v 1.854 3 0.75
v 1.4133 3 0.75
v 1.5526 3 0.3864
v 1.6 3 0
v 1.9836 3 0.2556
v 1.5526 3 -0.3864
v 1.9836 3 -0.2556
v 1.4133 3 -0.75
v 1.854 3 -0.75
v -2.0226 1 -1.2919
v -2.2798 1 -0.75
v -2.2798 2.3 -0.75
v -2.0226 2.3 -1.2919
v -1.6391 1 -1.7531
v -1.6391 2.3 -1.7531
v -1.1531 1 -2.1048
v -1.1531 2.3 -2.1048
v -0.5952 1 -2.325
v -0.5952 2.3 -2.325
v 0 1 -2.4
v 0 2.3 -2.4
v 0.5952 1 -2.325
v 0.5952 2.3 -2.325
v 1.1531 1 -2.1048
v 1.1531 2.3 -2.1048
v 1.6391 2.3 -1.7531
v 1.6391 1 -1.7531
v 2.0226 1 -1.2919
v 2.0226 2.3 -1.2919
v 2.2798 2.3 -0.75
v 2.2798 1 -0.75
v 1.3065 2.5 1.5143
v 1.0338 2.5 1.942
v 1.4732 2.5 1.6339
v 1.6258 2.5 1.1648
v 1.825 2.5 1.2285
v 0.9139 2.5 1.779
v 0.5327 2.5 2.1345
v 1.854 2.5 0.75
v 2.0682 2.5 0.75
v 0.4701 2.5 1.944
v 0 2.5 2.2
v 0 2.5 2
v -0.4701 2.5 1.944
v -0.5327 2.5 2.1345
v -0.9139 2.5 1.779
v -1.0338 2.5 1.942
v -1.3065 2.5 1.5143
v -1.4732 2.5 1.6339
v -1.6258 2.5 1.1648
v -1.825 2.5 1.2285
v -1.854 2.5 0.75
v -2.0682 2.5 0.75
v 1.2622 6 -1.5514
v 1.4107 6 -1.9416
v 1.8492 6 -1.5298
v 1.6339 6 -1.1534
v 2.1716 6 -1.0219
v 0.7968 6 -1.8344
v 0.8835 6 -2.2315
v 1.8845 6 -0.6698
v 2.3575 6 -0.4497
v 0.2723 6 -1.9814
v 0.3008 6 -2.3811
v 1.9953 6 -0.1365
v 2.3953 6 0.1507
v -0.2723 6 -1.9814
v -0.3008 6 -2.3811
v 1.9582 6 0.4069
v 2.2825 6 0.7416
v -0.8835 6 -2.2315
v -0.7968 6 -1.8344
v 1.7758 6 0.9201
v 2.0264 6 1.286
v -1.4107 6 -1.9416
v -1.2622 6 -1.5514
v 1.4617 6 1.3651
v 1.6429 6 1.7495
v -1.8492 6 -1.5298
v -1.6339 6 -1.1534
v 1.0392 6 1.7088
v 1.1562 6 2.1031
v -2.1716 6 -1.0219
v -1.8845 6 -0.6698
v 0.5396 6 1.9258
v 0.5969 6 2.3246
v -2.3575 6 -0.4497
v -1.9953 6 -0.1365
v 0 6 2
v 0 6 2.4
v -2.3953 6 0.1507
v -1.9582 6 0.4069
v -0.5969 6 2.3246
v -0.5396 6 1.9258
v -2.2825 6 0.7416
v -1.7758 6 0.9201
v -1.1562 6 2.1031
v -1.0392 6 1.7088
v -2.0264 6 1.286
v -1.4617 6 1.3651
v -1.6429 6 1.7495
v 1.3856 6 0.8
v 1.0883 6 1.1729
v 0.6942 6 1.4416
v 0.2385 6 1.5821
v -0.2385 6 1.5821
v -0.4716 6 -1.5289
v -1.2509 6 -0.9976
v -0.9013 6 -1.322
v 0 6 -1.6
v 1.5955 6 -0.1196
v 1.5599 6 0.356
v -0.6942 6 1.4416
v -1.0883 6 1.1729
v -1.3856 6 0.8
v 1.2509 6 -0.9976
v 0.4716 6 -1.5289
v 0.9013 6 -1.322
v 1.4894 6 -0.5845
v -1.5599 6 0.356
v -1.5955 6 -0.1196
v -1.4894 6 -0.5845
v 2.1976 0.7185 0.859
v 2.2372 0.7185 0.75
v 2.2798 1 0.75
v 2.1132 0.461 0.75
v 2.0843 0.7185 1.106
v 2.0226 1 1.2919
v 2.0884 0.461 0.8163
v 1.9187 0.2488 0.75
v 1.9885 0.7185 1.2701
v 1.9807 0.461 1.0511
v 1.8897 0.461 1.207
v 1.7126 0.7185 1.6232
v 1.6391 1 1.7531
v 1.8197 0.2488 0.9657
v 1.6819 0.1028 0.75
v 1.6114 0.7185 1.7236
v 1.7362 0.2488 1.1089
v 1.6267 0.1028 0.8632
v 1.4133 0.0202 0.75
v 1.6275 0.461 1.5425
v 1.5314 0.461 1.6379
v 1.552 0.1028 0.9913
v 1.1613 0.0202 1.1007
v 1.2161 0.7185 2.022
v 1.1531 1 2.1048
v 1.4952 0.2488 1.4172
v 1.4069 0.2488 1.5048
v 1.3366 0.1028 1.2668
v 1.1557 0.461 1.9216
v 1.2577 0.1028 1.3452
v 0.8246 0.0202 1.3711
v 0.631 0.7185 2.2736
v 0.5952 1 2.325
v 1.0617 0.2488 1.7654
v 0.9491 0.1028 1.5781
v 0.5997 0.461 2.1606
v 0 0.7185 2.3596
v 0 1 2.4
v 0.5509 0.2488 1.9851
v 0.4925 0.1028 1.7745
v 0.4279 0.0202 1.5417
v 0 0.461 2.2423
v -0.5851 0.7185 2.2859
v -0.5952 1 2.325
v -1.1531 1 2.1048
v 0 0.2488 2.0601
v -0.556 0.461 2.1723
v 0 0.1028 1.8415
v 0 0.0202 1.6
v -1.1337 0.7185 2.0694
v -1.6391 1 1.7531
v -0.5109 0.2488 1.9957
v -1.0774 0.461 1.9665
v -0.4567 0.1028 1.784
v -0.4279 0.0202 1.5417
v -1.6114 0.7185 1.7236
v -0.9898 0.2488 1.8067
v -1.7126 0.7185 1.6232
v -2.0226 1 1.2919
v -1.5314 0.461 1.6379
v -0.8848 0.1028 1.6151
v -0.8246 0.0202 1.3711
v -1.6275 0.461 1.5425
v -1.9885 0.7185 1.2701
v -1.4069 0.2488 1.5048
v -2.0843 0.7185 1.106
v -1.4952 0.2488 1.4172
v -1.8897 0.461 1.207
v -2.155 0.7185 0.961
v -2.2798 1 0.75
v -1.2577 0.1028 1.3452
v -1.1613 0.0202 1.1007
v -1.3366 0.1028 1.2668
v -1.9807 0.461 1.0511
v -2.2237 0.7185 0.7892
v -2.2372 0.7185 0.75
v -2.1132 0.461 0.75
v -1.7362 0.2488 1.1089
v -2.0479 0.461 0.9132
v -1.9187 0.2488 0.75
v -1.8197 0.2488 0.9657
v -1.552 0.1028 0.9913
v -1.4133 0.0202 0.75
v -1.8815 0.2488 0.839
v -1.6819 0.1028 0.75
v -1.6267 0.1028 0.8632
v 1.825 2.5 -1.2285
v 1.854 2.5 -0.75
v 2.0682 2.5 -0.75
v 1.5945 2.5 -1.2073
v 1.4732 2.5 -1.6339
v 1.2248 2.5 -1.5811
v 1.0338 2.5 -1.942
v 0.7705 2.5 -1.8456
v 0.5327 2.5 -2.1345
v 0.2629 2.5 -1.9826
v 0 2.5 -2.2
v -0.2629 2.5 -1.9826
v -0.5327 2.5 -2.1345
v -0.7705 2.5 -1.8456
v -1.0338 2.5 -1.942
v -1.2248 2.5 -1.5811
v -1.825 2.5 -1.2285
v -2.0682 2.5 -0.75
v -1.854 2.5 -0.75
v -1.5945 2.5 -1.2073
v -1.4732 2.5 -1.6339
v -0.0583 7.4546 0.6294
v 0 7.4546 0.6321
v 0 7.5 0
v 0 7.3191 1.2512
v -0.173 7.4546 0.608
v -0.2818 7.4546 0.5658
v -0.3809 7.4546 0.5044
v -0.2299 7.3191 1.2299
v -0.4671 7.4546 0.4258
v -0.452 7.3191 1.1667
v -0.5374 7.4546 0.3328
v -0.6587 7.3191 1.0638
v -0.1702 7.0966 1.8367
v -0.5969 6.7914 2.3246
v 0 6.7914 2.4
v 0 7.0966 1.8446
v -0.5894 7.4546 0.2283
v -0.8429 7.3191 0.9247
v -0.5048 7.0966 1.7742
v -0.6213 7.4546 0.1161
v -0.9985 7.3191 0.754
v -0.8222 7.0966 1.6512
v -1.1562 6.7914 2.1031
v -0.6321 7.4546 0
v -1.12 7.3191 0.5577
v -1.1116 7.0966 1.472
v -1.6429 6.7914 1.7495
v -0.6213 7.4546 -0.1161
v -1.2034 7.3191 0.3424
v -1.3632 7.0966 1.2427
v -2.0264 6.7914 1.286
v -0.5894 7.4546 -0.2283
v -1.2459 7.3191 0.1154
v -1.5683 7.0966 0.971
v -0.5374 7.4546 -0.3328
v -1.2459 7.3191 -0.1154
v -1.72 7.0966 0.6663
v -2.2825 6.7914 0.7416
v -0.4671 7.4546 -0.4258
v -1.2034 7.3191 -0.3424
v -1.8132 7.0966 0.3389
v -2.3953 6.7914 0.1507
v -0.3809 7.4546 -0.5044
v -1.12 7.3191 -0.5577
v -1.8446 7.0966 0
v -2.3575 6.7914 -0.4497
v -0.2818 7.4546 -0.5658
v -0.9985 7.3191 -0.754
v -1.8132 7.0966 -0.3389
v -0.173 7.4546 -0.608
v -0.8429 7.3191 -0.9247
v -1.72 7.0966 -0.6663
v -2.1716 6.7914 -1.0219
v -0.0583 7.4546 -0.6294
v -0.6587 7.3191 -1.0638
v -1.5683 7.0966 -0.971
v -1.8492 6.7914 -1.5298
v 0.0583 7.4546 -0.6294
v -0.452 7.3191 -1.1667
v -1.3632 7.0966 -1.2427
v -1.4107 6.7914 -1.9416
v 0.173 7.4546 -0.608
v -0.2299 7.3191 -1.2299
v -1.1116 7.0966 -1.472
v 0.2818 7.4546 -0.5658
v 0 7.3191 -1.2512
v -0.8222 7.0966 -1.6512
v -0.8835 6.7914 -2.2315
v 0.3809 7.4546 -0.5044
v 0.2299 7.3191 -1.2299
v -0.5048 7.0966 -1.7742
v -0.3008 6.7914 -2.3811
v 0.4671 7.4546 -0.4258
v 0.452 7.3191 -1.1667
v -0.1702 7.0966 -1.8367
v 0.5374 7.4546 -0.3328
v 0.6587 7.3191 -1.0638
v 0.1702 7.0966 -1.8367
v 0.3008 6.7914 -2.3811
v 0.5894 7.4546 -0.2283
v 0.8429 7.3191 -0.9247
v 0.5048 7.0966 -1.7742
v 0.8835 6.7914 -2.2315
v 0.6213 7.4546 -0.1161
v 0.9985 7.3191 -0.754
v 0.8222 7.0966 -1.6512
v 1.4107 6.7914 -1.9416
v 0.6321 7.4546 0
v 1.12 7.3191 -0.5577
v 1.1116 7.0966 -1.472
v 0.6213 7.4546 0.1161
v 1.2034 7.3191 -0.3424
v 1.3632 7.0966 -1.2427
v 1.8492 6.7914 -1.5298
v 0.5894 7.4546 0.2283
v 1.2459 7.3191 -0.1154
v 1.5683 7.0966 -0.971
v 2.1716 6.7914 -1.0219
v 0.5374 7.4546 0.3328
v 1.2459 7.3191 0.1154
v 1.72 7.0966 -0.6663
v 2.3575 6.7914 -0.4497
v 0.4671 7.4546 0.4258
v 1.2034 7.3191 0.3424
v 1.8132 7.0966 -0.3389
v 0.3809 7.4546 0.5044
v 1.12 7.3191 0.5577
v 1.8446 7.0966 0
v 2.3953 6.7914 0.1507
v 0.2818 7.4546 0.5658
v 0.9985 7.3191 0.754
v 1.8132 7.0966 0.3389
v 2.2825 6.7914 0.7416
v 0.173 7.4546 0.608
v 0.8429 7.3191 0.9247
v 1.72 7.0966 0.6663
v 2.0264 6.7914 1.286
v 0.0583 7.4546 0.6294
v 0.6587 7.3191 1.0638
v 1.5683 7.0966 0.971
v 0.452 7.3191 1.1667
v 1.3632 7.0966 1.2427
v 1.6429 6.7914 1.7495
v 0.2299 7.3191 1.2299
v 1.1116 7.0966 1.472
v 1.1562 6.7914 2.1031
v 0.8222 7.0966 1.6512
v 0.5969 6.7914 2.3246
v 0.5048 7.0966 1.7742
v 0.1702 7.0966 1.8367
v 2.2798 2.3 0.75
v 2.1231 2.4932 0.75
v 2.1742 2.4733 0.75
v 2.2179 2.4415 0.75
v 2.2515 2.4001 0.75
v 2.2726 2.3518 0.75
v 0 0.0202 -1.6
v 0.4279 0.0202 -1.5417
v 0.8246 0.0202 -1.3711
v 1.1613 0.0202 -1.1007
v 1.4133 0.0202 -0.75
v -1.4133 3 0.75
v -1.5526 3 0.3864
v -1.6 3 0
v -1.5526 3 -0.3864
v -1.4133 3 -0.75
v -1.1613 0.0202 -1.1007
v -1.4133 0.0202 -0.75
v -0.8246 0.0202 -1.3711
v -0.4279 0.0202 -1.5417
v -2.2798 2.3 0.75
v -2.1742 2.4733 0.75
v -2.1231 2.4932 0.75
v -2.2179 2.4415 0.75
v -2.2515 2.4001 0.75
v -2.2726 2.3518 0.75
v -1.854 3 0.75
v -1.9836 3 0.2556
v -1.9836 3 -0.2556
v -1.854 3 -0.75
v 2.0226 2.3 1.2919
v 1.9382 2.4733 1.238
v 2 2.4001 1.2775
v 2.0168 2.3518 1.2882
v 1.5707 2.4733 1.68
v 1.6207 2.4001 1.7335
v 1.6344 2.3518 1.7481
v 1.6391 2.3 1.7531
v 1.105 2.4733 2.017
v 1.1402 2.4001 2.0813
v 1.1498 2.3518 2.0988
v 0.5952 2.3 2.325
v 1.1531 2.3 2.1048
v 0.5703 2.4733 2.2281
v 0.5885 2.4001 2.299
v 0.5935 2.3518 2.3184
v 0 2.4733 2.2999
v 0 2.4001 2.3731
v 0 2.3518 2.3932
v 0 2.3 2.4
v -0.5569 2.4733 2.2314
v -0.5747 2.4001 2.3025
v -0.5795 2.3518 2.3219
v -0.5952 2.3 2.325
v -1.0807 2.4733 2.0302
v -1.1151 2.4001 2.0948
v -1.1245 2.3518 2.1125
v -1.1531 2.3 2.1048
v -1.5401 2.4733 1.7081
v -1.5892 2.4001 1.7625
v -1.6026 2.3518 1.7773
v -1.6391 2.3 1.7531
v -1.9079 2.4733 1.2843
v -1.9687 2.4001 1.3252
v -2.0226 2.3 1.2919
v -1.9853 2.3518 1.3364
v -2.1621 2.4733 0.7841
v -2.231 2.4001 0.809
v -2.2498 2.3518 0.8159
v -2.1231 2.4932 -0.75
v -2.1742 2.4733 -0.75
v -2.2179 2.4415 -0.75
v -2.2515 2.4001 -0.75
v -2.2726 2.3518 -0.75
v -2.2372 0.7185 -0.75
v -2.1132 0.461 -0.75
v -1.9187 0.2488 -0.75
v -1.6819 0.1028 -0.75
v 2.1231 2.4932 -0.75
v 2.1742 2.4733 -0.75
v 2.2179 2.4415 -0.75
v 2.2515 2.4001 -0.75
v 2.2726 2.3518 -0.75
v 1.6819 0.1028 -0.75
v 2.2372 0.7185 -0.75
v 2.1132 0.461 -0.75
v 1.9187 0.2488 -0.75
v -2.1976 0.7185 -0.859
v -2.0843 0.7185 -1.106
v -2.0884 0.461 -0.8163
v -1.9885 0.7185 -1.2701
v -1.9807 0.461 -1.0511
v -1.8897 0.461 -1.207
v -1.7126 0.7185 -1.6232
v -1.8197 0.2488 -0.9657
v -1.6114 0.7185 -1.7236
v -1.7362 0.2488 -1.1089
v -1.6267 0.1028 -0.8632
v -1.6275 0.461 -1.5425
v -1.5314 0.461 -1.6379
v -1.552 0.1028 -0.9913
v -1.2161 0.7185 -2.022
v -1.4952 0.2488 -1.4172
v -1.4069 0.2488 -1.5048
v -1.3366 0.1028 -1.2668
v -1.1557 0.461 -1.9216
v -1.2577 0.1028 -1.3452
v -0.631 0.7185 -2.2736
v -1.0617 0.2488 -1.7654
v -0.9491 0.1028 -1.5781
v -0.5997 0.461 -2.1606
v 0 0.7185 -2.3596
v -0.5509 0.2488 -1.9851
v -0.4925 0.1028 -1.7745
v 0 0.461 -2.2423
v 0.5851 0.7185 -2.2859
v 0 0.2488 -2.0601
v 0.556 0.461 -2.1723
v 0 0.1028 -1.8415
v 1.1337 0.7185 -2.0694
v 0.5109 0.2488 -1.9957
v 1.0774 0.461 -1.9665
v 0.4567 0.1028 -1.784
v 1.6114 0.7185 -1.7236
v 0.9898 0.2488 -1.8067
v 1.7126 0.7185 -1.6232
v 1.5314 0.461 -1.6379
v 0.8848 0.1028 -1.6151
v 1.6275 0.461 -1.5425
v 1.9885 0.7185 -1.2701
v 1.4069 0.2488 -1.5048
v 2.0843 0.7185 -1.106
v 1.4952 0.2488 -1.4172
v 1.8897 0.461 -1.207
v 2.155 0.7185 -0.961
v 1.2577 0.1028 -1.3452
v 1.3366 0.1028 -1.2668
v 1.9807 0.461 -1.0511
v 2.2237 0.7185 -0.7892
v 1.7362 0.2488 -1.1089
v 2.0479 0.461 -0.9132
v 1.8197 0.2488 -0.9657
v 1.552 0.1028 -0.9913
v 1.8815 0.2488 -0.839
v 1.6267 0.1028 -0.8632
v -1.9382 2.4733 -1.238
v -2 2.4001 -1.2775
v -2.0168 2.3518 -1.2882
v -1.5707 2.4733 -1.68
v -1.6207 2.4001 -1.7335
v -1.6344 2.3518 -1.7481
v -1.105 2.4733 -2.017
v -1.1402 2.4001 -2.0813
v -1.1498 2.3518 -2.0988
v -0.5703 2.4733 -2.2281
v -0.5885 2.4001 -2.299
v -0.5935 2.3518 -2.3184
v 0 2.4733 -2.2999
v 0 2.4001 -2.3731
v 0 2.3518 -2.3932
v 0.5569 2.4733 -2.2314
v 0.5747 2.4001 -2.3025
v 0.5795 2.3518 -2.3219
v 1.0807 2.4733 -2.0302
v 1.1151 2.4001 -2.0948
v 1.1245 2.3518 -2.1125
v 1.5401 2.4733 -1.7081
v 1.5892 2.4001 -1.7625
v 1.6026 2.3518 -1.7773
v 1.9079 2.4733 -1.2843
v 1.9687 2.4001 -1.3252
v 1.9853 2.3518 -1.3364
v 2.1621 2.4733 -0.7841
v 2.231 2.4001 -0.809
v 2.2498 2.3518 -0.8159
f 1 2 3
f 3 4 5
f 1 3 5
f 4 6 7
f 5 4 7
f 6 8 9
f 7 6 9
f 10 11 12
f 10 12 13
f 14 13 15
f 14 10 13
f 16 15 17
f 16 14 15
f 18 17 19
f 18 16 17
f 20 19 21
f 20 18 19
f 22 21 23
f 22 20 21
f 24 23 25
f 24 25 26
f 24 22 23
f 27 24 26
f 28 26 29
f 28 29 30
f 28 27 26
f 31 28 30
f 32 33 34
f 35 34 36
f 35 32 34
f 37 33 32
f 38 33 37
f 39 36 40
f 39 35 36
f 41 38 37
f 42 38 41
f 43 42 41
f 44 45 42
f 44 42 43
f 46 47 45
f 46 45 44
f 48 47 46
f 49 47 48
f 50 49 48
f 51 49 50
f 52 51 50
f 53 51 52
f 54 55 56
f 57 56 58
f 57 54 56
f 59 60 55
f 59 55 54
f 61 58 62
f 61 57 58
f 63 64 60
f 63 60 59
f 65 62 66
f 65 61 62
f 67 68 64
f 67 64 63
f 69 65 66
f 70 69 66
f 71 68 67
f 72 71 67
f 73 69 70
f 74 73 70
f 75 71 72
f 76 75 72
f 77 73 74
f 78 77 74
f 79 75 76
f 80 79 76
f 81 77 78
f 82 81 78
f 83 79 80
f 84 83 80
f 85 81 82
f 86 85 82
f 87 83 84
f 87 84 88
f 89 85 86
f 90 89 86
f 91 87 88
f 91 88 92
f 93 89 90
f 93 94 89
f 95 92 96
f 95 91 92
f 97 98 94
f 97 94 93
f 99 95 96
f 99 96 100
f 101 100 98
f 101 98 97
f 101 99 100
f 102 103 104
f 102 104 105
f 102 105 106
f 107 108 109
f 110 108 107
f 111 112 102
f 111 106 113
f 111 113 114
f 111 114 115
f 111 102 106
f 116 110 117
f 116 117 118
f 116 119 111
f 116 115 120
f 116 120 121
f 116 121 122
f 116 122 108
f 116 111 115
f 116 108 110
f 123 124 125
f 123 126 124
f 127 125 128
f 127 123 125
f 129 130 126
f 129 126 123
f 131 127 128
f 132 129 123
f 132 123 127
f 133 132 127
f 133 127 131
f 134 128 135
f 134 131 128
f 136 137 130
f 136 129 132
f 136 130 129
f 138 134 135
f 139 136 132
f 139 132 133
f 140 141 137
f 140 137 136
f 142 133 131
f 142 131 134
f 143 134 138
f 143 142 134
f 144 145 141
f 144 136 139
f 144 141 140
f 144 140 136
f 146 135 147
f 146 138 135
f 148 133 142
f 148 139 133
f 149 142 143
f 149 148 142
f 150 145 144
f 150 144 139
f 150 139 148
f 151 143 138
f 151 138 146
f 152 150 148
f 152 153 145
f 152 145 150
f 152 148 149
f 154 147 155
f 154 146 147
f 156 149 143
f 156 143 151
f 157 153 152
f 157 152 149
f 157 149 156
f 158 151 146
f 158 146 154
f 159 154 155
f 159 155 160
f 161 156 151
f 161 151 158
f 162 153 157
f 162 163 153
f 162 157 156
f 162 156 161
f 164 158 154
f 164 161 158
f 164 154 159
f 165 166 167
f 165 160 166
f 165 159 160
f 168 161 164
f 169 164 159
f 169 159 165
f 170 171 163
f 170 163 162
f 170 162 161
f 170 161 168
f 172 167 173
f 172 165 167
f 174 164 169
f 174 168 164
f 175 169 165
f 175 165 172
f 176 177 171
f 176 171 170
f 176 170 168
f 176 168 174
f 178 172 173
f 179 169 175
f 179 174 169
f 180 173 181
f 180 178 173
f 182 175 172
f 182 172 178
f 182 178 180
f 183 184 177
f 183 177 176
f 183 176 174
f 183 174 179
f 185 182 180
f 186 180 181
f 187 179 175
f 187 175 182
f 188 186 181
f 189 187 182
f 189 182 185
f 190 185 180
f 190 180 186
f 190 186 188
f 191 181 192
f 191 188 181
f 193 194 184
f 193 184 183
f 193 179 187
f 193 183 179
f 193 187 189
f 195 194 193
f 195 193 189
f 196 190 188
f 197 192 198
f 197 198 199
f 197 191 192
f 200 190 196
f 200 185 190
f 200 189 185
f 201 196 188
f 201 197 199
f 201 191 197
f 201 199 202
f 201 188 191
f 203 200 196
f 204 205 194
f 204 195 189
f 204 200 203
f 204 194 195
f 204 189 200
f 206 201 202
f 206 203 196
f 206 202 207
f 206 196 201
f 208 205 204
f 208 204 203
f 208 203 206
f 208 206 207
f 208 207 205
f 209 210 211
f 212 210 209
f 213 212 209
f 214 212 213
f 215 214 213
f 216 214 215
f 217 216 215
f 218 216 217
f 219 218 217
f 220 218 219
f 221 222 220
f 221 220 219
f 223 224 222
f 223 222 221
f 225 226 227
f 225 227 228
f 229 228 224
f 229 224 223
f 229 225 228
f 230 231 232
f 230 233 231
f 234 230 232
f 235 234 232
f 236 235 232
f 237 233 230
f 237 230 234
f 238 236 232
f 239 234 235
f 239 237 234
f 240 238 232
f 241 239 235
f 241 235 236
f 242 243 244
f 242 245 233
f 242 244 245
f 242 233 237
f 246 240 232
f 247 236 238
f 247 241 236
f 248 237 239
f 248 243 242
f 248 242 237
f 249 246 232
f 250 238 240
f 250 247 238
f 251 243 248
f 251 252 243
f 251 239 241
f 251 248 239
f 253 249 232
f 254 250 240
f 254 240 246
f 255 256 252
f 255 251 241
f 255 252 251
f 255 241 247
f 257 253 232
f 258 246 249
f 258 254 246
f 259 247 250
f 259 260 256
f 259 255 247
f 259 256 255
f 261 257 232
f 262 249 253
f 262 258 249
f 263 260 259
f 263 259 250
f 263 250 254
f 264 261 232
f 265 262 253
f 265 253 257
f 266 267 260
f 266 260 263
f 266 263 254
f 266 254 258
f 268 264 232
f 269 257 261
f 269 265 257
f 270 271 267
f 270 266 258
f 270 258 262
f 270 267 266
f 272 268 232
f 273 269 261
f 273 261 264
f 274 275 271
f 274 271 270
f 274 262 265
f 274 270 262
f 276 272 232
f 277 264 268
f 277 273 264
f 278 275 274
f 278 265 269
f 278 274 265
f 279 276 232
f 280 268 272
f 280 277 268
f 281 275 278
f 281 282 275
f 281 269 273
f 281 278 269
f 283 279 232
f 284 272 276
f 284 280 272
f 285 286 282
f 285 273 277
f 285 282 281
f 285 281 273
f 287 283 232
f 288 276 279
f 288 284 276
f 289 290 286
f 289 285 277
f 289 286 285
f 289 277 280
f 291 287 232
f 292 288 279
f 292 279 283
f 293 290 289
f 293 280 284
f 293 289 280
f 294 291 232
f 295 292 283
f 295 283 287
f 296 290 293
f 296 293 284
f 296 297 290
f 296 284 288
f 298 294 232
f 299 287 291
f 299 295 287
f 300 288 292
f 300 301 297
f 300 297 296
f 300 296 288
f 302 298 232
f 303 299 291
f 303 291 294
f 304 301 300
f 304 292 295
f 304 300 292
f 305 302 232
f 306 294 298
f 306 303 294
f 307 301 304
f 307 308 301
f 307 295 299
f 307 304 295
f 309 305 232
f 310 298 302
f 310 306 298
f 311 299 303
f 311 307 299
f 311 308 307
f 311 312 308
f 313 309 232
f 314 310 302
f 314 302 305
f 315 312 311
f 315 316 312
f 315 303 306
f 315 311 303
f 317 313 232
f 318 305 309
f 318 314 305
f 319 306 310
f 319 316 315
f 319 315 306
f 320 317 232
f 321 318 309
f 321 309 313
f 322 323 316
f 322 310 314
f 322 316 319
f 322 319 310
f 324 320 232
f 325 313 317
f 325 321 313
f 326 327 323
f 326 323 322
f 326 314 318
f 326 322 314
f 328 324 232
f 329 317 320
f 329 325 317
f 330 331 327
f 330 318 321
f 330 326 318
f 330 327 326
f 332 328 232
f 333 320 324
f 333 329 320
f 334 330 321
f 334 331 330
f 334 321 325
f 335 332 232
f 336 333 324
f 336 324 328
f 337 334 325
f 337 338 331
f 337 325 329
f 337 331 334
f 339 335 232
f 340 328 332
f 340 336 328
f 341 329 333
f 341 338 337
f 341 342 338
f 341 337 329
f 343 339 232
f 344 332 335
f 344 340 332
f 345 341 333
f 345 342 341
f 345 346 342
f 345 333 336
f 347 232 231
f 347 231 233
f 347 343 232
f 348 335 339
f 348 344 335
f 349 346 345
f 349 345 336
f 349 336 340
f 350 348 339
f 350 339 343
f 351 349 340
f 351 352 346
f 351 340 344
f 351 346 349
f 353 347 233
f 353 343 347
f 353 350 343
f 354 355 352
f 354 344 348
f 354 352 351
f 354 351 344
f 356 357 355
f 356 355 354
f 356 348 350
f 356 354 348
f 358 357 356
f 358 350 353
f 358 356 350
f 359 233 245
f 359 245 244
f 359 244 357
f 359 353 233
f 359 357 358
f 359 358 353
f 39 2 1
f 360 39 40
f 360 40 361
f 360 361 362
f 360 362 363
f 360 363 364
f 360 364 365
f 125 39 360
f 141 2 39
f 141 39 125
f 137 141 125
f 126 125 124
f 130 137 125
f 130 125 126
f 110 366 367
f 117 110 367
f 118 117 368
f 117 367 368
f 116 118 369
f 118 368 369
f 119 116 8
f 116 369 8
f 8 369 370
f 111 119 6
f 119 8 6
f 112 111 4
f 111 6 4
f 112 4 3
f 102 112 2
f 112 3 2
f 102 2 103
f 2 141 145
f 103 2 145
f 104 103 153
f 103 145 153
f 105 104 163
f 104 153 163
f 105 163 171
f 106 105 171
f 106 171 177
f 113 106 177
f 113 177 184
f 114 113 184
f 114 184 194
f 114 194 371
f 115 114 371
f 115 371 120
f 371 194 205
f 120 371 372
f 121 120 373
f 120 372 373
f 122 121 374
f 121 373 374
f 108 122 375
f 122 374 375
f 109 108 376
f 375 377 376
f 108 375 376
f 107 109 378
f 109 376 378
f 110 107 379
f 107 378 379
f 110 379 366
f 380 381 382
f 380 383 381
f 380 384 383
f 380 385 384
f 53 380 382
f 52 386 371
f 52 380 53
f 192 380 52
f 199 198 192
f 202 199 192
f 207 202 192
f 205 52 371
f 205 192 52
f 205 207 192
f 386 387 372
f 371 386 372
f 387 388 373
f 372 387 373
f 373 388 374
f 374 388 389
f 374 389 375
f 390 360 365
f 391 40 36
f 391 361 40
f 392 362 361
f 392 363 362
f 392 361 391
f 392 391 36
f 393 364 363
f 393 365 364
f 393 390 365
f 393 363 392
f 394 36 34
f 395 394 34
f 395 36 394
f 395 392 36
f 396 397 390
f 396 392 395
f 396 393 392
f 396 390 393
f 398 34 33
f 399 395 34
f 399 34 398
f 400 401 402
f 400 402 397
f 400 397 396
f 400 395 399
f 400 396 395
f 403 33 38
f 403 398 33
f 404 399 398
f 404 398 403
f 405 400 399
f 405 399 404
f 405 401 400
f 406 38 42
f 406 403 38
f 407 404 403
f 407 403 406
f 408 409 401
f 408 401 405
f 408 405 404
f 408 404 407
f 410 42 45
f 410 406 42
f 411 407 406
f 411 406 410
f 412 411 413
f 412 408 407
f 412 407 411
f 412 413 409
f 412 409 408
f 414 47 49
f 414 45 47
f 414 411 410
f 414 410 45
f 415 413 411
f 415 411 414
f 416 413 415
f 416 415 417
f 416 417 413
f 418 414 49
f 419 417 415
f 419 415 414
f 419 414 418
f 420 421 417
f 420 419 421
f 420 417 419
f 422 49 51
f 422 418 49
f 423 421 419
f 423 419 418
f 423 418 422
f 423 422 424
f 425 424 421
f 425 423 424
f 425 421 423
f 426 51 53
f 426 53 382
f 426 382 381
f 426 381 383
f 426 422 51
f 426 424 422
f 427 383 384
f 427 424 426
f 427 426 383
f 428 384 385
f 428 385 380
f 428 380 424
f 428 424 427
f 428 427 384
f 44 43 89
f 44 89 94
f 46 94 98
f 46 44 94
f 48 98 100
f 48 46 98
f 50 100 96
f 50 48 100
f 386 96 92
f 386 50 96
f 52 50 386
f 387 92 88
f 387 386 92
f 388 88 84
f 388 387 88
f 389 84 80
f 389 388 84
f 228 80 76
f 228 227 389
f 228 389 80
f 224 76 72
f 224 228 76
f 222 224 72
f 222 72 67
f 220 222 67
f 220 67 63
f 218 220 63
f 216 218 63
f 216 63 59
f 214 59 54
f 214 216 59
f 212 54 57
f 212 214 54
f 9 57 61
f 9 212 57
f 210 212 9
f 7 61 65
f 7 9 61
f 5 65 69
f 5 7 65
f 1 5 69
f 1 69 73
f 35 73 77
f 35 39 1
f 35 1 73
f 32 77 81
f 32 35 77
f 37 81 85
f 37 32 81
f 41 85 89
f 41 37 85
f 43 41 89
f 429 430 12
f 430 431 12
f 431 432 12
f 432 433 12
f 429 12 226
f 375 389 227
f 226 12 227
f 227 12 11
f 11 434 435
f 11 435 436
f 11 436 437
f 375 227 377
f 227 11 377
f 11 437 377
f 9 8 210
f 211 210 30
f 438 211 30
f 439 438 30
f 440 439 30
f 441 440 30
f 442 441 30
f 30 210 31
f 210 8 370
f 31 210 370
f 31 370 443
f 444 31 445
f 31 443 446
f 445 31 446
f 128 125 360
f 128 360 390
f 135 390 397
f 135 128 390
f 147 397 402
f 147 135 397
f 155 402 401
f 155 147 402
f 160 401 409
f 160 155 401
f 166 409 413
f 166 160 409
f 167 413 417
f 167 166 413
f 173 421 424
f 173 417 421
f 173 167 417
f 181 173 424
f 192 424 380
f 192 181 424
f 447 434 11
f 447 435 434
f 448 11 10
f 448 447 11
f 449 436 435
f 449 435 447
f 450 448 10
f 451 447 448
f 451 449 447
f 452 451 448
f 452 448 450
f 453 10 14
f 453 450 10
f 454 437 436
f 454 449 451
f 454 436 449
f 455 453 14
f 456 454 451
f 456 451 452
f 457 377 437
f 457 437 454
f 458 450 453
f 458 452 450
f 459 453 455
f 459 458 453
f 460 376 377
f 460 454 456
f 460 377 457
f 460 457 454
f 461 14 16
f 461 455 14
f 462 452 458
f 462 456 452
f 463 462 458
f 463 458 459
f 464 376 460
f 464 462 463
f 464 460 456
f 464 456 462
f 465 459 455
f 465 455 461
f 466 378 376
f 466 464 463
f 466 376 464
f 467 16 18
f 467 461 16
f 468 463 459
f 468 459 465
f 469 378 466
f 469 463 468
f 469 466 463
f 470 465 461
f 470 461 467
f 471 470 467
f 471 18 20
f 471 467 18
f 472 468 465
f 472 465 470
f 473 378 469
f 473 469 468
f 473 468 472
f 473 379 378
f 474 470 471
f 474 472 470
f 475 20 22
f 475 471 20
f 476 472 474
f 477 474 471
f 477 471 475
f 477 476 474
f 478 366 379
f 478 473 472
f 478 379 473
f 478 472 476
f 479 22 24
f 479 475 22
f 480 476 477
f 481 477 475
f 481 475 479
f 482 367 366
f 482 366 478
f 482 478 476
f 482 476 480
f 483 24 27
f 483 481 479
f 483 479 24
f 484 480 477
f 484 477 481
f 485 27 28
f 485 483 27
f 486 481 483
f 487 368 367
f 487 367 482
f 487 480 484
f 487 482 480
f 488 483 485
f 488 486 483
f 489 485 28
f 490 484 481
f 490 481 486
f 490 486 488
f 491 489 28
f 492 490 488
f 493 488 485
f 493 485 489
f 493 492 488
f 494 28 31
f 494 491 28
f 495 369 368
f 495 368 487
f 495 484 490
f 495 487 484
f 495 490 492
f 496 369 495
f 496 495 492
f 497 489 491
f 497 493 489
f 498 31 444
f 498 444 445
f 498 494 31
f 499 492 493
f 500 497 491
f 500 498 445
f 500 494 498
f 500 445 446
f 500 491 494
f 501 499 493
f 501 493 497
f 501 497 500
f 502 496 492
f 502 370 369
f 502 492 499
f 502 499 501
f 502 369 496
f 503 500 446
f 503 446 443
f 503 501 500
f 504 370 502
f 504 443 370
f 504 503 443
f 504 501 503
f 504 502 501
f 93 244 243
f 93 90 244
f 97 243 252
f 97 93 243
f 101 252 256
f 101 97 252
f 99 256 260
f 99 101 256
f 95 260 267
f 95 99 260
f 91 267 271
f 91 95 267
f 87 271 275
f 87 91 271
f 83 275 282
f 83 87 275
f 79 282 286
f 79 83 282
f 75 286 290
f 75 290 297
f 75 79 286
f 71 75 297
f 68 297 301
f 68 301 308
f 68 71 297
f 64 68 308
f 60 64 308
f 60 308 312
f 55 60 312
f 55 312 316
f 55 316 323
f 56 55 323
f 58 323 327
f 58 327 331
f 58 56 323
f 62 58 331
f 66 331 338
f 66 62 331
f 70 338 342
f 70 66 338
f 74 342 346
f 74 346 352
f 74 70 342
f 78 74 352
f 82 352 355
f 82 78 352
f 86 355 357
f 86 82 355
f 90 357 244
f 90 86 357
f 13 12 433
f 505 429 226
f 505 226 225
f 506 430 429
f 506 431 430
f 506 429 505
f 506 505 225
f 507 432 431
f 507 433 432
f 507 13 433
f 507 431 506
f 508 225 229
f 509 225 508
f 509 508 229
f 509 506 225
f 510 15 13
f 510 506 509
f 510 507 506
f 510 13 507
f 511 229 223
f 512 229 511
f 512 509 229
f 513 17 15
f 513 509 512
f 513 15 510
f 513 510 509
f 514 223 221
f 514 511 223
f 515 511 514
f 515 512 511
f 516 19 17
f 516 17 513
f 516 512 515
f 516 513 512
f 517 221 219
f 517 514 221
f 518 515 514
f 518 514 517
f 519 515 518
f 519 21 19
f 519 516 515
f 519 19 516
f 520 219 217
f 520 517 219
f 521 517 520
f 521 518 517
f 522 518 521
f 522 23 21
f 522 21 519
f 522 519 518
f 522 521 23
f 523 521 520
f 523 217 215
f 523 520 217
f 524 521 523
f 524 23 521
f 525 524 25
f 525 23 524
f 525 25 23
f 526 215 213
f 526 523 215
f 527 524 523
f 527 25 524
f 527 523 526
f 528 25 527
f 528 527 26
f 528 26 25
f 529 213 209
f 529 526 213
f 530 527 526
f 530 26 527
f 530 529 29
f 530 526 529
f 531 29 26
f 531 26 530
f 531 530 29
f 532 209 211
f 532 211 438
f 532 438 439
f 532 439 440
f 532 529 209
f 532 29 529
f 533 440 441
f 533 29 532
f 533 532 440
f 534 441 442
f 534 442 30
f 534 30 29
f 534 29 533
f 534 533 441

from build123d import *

# Parameters (mm, degrees)
SKETCH_4_R          = 1.6
CUT_EXTRUDE_1_DEPTH = 6
SKETCH_5_W          = 6.845786851
SKETCH_5_H          = 1.5
CUT_EXTRUDE_3_DEPTH = 3


with BuildPart() as part:
    # 草图3 → 旋转1 (revolve)
    with BuildSketch(Plane(origin=(0, 0, 0), x_dir=(0, 0, -1), z_dir=(1, 0, 0)), mode=Mode.PRIVATE) as revolve_1_sk:
        with BuildLine():
            Line((2.4, 6.791402502), (2.4, 6))
            Line((2.4, 6), (2, 6))
            Line((2, 6), (2, 2.5))
            Line((2, 2.5), (2.2, 2.5))
            ThreePointArc((2.2, 2.5), (2.341421356, 2.441421356), (2.4, 2.3))
            Line((2.4, 2.3), (2.4, 1))
            ThreePointArc((2.4, 1), (2.107106781, 0.292893219), (1.4, 0))
            Line((1.4, 0), (0, 0))
            Line((0, 0), (0, 7.5))
            ThreePointArc((0, 7.5), (1.251210455, 7.319149638), (2.4, 6.791402502))
        make_face()
    revolve(revolve_1_sk.sketch.rotate(Axis((0, 28.211895781, 0), (0, -1, 0)), 180), axis=Axis((0, 28.211895781, 0), (0, -1, 0)))

    # 草图4 → 切除-拉伸1 (cut)
    with BuildSketch(Plane.XZ):
        with Locations(Location((0, 0, 0), (0, 0, 270))):
            Circle(SKETCH_4_R)
    extrude(amount=-CUT_EXTRUDE_1_DEPTH, mode=Mode.SUBTRACT)

    # 草图5 → 切除-拉伸3 (cut)
    with BuildSketch(Plane(origin=(0, 0, 0), x_dir=(1, 0, 0), z_dir=(0, 1, 0))):
        with Locations((0.068457868, 0)):
            Rectangle(SKETCH_5_W, SKETCH_5_H)
    extrude(amount=CUT_EXTRUDE_3_DEPTH, mode=Mode.SUBTRACT)


solid = part.part
